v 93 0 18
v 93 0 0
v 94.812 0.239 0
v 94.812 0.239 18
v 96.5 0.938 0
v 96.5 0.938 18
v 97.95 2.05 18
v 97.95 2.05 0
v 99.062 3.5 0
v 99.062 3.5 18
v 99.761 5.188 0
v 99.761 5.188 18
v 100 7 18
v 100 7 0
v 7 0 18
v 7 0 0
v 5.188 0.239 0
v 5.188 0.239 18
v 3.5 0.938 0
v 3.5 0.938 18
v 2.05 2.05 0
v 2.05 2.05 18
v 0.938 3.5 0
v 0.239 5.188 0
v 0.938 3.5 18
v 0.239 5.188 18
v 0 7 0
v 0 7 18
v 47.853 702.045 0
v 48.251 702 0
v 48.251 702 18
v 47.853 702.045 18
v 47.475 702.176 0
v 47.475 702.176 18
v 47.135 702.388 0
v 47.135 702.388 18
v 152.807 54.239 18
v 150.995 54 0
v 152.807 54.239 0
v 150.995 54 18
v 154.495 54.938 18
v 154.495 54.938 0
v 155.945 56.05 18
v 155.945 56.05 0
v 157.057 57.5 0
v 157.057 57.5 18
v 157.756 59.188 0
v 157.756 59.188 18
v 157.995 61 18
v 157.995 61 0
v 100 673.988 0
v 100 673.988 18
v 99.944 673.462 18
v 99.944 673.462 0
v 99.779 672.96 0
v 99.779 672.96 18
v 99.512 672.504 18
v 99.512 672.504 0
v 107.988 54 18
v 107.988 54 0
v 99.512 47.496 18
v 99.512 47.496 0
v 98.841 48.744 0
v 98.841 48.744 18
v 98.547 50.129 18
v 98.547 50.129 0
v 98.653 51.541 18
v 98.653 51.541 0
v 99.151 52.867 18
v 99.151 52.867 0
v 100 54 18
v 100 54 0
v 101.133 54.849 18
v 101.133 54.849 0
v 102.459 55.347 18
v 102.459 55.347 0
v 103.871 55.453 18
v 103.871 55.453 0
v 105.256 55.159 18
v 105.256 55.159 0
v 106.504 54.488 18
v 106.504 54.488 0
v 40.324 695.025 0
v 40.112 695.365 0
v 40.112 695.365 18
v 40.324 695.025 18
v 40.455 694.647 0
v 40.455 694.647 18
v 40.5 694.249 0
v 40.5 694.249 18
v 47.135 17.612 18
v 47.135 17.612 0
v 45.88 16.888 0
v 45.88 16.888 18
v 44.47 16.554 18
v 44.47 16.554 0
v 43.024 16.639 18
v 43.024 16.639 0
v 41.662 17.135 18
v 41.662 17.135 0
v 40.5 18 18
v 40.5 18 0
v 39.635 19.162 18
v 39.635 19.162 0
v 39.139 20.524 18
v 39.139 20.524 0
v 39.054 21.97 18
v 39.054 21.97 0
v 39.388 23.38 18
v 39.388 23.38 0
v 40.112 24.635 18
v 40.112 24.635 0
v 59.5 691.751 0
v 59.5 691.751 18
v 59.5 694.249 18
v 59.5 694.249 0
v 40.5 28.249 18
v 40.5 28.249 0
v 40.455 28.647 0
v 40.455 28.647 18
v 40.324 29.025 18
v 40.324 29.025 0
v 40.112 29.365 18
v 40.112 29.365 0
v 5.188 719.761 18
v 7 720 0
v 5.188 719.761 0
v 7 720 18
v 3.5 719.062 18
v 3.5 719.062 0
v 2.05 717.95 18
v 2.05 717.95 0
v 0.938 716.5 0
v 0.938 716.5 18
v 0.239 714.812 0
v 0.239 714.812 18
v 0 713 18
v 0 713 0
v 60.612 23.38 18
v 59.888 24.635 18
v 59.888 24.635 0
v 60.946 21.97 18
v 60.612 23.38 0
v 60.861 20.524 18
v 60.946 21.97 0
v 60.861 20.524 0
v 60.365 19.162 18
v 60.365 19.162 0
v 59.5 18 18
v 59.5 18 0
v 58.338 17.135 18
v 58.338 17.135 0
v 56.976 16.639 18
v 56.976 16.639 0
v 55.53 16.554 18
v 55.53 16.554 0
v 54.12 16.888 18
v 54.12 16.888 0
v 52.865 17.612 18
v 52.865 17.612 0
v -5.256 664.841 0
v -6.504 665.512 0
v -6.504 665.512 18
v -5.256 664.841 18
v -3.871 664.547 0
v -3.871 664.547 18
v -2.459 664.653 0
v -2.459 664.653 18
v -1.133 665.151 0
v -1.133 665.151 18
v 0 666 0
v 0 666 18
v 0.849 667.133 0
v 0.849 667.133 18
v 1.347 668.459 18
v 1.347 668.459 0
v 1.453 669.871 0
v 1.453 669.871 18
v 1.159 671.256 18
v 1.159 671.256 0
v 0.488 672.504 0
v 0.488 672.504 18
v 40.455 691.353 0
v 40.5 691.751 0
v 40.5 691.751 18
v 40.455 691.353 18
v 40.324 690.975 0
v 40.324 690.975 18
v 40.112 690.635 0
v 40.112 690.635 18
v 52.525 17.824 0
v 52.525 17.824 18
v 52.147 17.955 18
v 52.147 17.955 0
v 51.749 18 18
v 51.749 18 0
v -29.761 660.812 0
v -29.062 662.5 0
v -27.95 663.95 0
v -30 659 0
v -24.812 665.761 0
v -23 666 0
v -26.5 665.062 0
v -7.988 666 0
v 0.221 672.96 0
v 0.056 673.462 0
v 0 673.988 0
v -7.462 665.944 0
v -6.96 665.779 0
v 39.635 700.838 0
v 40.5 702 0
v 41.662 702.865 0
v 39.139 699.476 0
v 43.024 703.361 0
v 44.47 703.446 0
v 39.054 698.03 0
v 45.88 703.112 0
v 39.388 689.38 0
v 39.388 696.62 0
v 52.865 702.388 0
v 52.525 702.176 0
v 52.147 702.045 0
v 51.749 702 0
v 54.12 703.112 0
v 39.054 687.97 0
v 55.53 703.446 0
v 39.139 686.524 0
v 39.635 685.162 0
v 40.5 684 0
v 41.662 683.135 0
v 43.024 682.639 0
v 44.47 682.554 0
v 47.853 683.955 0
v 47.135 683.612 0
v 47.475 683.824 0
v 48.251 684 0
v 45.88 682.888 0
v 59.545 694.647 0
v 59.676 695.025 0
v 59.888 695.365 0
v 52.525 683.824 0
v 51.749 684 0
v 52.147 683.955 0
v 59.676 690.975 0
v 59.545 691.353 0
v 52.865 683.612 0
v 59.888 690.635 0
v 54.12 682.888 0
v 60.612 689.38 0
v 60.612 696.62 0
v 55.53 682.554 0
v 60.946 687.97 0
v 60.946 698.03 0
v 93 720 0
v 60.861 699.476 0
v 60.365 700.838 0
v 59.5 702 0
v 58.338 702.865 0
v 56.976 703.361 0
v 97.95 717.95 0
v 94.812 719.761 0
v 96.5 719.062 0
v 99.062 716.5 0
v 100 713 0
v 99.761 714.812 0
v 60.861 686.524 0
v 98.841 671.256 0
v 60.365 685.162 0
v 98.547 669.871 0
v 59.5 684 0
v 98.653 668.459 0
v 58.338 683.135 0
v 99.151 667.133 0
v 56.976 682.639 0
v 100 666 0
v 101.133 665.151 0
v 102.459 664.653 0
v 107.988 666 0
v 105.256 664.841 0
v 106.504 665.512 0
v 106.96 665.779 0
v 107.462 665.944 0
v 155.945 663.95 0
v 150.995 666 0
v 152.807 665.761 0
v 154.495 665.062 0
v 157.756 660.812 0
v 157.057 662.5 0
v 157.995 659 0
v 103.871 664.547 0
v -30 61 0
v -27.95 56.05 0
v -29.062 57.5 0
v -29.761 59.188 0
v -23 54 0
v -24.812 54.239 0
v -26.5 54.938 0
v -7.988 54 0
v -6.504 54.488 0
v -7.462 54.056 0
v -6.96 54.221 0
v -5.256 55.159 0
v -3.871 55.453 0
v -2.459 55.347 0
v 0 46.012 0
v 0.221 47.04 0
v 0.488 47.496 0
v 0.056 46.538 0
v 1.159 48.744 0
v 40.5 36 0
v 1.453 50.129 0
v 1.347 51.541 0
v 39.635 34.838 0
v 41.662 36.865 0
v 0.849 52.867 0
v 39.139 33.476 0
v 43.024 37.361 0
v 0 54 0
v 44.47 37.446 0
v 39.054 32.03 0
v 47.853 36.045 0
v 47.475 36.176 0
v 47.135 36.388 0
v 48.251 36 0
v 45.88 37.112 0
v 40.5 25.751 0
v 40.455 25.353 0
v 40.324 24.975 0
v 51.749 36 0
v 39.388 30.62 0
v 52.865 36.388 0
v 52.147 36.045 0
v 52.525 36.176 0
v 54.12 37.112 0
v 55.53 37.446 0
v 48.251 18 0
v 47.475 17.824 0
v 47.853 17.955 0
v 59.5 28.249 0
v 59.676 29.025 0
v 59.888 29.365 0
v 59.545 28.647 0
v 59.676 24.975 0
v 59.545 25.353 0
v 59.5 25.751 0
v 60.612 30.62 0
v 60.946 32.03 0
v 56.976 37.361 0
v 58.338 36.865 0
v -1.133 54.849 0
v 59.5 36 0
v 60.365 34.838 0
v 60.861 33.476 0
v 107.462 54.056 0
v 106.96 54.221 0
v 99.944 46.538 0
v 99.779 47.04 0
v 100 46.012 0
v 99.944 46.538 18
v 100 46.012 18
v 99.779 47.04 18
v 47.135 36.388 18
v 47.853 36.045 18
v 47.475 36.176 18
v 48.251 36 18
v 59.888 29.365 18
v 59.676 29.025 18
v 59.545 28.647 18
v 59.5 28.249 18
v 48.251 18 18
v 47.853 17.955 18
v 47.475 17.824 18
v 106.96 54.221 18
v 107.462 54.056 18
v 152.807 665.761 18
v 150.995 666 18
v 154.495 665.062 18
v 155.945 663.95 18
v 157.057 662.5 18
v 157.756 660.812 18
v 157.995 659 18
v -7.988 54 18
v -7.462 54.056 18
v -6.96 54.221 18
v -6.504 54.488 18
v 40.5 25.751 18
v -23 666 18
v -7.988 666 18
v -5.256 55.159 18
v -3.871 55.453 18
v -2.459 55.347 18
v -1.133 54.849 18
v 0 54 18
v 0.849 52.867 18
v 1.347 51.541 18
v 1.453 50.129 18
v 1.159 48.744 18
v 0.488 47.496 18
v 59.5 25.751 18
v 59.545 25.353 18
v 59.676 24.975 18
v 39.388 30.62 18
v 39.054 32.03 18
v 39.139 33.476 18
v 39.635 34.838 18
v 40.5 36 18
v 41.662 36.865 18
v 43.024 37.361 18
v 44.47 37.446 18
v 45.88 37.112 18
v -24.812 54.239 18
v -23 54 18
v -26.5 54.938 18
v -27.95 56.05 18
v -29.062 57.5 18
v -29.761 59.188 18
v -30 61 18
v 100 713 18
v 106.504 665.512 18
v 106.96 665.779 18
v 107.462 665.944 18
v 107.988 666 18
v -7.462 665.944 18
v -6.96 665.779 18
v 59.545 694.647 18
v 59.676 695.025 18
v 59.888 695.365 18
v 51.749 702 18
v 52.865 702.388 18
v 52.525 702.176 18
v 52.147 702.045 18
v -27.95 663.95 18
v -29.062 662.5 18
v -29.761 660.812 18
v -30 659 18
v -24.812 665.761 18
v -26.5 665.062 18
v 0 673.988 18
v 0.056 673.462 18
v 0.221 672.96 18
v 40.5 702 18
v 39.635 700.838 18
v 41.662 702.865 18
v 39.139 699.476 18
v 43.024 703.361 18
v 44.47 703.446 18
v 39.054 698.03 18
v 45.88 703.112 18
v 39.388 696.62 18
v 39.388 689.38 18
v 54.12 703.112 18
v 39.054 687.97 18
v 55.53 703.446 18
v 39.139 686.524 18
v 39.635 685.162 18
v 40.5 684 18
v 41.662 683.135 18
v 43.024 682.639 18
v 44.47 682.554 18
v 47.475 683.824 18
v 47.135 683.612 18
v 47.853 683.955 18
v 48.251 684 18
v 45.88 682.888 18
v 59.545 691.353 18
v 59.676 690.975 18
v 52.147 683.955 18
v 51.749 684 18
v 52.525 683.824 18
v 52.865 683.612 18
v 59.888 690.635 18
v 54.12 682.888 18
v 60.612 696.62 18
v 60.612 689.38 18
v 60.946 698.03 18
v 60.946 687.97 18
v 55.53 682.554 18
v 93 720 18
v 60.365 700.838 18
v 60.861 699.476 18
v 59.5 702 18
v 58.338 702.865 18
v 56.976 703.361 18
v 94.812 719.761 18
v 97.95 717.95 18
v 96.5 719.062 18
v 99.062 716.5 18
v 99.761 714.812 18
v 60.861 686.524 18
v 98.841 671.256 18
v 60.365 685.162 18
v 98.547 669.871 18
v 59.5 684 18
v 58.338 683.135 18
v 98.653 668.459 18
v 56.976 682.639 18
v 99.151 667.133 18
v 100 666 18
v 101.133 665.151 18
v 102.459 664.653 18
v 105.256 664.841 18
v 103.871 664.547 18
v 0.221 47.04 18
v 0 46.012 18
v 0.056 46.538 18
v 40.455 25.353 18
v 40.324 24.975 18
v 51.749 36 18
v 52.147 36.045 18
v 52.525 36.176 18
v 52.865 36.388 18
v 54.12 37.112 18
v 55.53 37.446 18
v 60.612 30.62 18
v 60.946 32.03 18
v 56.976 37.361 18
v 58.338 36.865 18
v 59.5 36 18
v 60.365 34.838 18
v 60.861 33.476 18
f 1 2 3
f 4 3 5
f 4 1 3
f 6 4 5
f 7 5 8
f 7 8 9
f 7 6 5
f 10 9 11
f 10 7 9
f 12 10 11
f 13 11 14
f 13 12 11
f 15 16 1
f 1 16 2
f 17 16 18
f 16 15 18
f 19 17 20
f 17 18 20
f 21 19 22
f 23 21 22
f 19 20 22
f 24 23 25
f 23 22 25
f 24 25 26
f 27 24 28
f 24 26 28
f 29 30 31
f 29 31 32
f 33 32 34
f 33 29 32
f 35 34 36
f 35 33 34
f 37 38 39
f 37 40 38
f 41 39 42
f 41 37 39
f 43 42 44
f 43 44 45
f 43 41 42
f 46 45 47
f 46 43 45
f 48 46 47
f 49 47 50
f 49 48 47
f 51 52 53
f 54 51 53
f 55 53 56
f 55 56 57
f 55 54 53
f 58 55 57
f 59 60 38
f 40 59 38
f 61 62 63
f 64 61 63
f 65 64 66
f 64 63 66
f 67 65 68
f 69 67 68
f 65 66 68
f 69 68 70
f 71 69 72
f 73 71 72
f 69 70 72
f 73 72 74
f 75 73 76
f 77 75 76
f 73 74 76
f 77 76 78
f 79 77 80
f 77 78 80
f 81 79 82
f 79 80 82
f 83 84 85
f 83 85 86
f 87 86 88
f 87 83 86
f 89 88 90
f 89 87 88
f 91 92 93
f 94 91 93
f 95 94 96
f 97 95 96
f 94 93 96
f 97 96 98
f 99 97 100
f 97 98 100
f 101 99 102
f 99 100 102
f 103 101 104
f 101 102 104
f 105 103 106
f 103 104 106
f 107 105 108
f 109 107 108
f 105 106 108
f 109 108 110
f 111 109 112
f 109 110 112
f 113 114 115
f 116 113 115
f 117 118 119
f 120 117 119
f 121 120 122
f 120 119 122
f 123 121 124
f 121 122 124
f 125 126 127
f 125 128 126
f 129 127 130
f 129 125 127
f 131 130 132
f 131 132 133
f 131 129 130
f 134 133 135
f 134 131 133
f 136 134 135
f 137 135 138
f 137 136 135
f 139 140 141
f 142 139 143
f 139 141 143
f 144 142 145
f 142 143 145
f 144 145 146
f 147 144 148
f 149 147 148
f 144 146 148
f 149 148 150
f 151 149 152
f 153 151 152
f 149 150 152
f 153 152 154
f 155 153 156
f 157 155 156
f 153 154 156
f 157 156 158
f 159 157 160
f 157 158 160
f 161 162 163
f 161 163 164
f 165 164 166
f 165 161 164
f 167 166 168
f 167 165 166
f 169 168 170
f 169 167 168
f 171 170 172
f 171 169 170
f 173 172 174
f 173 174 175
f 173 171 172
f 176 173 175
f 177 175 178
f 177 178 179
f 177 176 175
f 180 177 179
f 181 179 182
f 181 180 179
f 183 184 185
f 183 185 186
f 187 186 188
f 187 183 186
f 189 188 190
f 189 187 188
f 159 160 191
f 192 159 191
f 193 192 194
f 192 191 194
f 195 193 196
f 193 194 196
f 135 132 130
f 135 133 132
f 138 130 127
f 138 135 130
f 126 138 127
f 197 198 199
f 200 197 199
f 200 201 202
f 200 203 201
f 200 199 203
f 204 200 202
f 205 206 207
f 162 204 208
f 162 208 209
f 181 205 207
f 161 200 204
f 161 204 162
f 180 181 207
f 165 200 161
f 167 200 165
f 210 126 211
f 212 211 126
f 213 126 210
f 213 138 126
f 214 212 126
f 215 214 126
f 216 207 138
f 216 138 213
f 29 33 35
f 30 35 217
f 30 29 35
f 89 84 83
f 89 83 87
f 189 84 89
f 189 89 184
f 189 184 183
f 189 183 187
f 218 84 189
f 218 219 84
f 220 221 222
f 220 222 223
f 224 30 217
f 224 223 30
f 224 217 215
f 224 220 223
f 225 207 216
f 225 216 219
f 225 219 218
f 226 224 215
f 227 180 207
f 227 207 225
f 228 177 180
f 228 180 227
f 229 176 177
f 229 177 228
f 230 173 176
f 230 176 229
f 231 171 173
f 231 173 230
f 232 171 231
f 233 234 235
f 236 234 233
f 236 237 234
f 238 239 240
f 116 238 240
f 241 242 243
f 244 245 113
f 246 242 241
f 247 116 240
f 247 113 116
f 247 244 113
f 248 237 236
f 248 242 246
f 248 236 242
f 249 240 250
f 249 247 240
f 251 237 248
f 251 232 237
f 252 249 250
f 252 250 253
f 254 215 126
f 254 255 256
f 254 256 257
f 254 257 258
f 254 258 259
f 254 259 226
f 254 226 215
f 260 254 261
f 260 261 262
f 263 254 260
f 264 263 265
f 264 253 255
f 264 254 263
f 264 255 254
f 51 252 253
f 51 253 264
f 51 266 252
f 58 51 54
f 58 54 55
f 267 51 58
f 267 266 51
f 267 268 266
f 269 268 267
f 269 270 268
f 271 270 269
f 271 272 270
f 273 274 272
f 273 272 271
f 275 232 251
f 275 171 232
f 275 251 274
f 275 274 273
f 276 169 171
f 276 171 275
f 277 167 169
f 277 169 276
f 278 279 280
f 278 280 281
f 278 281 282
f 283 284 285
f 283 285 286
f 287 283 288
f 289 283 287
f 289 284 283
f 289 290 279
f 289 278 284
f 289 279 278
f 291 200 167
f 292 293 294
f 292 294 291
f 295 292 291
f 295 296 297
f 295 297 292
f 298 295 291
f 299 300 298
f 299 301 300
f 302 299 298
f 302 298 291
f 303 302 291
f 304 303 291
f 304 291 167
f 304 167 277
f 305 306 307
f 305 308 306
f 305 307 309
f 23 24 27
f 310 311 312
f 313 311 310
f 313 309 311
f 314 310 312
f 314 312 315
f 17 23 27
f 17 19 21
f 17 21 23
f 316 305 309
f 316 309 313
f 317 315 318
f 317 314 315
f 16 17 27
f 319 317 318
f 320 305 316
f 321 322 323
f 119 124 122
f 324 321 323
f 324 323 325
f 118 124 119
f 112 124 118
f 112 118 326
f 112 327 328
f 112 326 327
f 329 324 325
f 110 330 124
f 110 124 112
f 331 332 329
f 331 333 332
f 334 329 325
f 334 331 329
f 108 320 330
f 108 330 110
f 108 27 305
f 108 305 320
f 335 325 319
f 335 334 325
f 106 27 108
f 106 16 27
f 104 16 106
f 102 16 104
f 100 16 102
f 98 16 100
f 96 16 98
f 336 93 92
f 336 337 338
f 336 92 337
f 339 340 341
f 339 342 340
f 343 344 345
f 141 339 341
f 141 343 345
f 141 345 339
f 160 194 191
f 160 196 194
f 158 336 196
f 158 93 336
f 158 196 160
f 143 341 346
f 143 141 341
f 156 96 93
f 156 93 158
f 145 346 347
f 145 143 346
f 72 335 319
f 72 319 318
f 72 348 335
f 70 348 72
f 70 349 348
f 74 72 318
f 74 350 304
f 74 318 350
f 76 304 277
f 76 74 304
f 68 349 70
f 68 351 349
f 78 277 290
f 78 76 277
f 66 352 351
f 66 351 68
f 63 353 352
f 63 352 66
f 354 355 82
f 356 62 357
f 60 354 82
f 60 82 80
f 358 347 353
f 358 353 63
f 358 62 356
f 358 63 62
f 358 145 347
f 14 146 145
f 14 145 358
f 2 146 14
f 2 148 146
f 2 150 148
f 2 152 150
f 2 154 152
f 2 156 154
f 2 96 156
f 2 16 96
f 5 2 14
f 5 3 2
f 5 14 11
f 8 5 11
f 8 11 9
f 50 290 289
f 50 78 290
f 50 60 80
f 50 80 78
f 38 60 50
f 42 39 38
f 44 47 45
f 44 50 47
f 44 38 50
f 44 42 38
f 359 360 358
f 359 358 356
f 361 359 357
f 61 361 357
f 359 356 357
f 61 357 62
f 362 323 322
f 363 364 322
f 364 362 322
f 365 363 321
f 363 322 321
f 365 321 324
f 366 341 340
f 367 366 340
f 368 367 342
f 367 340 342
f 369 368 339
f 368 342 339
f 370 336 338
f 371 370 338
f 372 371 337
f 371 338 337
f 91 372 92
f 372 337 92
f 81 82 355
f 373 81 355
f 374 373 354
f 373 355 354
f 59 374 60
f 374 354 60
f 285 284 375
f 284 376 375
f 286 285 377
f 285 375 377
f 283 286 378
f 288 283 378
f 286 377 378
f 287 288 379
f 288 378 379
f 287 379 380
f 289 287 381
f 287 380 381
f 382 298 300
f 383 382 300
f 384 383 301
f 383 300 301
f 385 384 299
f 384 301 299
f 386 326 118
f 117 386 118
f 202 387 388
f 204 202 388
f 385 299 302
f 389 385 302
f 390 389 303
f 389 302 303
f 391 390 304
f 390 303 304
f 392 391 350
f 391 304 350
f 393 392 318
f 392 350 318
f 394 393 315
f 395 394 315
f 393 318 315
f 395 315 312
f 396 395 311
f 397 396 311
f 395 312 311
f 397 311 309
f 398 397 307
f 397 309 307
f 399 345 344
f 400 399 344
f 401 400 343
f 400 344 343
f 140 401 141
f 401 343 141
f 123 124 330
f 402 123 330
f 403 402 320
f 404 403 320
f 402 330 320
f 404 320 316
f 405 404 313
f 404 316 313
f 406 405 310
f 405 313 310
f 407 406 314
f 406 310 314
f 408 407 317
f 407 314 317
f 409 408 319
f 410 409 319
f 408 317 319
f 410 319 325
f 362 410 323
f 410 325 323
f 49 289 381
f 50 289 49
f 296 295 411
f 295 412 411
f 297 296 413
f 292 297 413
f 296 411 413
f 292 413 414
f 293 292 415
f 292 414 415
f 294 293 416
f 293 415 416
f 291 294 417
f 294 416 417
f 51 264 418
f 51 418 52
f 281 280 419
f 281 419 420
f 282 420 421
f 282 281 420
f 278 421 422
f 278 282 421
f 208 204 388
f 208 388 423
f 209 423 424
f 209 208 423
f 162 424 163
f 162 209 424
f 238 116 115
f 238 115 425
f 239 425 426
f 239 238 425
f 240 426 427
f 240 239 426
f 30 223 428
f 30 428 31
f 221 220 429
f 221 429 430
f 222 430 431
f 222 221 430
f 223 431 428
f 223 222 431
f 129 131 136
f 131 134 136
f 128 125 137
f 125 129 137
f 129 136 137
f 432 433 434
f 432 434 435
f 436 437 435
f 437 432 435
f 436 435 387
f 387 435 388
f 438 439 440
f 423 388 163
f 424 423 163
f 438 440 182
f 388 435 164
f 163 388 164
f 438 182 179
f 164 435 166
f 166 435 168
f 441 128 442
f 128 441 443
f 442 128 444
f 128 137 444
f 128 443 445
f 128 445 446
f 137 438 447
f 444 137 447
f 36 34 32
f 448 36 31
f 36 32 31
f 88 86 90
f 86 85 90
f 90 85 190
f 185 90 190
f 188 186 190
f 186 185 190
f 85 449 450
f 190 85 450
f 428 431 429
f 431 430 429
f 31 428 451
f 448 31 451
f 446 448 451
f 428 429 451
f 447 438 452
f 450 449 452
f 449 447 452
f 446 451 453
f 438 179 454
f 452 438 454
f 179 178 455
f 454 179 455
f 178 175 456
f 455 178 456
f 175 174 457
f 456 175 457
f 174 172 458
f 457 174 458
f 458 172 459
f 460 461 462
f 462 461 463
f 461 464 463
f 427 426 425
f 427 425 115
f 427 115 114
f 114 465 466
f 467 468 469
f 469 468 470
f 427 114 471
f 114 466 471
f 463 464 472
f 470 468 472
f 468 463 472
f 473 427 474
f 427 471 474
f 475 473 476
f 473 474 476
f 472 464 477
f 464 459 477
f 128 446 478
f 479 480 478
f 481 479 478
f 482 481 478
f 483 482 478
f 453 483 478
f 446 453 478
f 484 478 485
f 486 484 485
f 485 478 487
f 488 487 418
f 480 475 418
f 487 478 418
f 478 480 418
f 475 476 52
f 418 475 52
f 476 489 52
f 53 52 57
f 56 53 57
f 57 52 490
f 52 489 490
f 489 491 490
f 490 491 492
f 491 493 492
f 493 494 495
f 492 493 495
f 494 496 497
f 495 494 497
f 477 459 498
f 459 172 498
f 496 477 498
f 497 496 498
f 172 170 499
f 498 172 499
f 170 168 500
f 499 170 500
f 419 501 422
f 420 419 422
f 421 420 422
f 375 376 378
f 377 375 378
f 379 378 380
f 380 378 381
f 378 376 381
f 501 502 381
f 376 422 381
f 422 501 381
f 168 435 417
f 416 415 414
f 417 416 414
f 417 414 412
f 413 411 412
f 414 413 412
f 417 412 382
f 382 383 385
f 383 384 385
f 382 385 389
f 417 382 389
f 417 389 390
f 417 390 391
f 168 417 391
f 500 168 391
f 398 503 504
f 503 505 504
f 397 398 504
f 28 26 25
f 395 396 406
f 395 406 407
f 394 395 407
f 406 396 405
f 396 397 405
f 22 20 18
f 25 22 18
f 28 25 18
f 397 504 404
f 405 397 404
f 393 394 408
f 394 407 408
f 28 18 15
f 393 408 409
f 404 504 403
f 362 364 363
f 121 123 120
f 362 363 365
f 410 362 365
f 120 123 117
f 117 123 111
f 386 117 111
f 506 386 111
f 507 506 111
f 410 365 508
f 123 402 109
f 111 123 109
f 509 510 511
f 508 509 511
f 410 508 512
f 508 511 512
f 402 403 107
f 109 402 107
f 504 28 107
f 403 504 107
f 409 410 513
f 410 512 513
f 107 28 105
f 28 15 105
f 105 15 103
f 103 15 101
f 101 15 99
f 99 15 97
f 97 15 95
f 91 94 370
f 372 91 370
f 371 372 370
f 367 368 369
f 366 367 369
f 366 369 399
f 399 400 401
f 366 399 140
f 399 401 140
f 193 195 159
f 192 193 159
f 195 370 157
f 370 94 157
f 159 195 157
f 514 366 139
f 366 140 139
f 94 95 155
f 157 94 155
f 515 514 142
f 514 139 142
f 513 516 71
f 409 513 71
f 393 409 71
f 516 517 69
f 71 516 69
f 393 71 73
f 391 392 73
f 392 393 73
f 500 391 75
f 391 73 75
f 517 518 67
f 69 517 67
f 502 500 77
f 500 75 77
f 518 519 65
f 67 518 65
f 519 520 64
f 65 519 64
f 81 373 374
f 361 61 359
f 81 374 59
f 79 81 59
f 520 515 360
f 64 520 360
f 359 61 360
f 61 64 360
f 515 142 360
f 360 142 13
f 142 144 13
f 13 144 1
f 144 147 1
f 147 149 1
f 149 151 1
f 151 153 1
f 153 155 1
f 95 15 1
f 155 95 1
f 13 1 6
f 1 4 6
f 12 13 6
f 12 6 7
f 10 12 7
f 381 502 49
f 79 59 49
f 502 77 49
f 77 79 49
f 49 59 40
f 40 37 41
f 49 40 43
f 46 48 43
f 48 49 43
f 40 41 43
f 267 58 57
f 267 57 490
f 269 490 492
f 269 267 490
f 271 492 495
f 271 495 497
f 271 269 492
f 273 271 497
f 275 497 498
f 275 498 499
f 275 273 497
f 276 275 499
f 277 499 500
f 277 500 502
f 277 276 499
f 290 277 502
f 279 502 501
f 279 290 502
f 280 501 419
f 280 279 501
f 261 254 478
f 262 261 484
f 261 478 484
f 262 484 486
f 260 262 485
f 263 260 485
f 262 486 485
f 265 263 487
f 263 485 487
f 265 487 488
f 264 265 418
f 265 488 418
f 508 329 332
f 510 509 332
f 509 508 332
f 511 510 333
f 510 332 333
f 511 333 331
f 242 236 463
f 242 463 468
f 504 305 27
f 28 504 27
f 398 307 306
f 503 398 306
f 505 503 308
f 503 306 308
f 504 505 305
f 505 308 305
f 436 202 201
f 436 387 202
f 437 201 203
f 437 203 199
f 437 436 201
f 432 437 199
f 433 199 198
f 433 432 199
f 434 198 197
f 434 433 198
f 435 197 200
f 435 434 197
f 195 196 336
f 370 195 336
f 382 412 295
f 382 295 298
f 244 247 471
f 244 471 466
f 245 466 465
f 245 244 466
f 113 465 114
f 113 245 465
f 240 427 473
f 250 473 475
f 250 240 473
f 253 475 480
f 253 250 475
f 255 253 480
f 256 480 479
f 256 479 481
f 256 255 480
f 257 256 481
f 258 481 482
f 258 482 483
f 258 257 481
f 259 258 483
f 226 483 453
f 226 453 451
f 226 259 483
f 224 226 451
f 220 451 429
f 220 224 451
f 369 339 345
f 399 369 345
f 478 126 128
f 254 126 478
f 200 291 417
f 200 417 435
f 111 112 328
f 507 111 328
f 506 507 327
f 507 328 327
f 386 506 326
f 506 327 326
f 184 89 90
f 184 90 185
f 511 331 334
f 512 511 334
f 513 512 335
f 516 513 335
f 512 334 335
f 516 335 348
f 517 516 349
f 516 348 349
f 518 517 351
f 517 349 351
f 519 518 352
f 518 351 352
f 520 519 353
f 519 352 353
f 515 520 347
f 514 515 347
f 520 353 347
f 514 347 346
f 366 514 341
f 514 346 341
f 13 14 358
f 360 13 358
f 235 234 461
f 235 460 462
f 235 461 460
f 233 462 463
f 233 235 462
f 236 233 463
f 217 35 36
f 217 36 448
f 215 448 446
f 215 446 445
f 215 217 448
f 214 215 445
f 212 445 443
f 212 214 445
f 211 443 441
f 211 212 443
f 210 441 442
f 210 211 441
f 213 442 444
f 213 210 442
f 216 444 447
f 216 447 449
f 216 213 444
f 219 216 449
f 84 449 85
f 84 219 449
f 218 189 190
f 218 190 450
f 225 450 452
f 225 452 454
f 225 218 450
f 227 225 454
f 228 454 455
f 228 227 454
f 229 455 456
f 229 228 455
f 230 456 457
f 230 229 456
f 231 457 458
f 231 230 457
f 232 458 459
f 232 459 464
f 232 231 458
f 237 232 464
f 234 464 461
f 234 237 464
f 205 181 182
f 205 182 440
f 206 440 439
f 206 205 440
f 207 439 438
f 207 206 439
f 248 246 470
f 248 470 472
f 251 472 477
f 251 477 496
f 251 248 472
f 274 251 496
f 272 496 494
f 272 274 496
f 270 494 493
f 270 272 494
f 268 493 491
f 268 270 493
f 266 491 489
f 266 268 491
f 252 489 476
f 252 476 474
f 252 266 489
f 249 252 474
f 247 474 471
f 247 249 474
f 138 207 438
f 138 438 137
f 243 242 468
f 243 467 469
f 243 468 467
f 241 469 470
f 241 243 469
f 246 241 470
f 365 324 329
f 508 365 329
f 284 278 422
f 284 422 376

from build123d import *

# Parameters (mm, degrees)
BOSS_EXTRU_2_DEPTH      = 18
ENL_V_MAT_EXTRU_1_DEPTH = 19
CONG_1_R                = 7


with BuildPart() as part:
    # Esquisse2 → Boss.-Extru.2 (new body)
    with BuildSketch(Plane.XY):
        with BuildLine():
            Line((0, 0), (100, 0))
            Line((100, 0), (100, 46.012238509))
            ThreePointArc((100, 46.012238509), (99.874827529, 46.793387794), (99.511844635, 47.496314371))
            ThreePointArc((99.511844635, 47.496314371), (100, 54), (106.503685629, 54.488155365))
            ThreePointArc((106.503685629, 54.488155365), (107.206612206, 54.125172471), (107.987761491, 54))
            Line((107.987761491, 54), (157.994949366, 54))
            Line((157.994949366, 54), (157.994949366, 360))
            Line((157.994949366, 360), (-30, 360))
            Line((-30, 360), (-30, 54))
            Line((-30, 54), (-7.987761491, 54))
            ThreePointArc((-7.987761491, 54), (-7.206612206, 54.125172471), (-6.503685629, 54.488155365))
            ThreePointArc((-6.503685629, 54.488155365), (0, 54), (0.488155365, 47.496314371))
            ThreePointArc((0.488155365, 47.496314371), (0.125172471, 46.793387794), (0, 46.012238509))
            Line((0, 46.012238509), (0, 0))
        make_face()
    extrude(amount=BOSS_EXTRU_2_DEPTH)

    # Esquisse1 → Enlèv. mat.-Extru.1 (cut, through all)
    with BuildSketch(Plane.XY):
        with BuildLine():
            Line((59.5, 28.248771852), (59.5, 25.751228148))
            ThreePointArc((59.5, 25.751228148), (59.599672829, 25.160561143), (59.88765279, 24.635309084))
            ThreePointArc((59.88765279, 24.635309084), (59.5, 18), (52.864690916, 17.61234721))
            ThreePointArc((52.864690916, 17.61234721), (52.339438857, 17.900327171), (51.748771852, 18))
            Line((51.748771852, 18), (48.251228148, 18))
            ThreePointArc((48.251228148, 18), (47.660561143, 17.900327171), (47.135309084, 17.61234721))
            ThreePointArc((47.135309084, 17.61234721), (40.5, 18), (40.11234721, 24.635309084))
            ThreePointArc((40.11234721, 24.635309084), (40.400327171, 25.160561143), (40.5, 25.751228148))
            Line((40.5, 25.751228148), (40.5, 28.248771852))
            ThreePointArc((40.5, 28.248771852), (40.400327171, 28.839438857), (40.11234721, 29.364690916))
            ThreePointArc((40.11234721, 29.364690916), (40.5, 36), (47.135309084, 36.38765279))
            ThreePointArc((47.135309084, 36.38765279), (47.660561143, 36.099672829), (48.251228148, 36))
            Line((48.251228148, 36), (51.748771852, 36))
            ThreePointArc((51.748771852, 36), (52.339438857, 36.099672829), (52.864690916, 36.38765279))
            ThreePointArc((52.864690916, 36.38765279), (59.5, 36), (59.88765279, 29.364690916))
            ThreePointArc((59.88765279, 29.364690916), (59.599672829, 28.839438857), (59.5, 28.248771852))
        make_face()
    extrude(amount=ENL_V_MAT_EXTRU_1_DEPTH, mode=Mode.SUBTRACT)

    # Congé1
    cong_1_edges = [part.edges().sort_by_distance(p)[0] for p in [
        (-30, 54, 9),
        (157.994949366, 54, 9),
        (100, 0, 9),
        (0, 0, 9),
    ]]
    fillet(cong_1_edges, radius=CONG_1_R)

    # Symétrie1: part across plane


with BuildPart() as part_1:
    add(part.part)
    add(part.part.mirror(Plane(origin=(157.994949366, 360, 18), x_dir=(0, 0, 1), z_dir=(0, -1, 0))))


solid = part_1.part
